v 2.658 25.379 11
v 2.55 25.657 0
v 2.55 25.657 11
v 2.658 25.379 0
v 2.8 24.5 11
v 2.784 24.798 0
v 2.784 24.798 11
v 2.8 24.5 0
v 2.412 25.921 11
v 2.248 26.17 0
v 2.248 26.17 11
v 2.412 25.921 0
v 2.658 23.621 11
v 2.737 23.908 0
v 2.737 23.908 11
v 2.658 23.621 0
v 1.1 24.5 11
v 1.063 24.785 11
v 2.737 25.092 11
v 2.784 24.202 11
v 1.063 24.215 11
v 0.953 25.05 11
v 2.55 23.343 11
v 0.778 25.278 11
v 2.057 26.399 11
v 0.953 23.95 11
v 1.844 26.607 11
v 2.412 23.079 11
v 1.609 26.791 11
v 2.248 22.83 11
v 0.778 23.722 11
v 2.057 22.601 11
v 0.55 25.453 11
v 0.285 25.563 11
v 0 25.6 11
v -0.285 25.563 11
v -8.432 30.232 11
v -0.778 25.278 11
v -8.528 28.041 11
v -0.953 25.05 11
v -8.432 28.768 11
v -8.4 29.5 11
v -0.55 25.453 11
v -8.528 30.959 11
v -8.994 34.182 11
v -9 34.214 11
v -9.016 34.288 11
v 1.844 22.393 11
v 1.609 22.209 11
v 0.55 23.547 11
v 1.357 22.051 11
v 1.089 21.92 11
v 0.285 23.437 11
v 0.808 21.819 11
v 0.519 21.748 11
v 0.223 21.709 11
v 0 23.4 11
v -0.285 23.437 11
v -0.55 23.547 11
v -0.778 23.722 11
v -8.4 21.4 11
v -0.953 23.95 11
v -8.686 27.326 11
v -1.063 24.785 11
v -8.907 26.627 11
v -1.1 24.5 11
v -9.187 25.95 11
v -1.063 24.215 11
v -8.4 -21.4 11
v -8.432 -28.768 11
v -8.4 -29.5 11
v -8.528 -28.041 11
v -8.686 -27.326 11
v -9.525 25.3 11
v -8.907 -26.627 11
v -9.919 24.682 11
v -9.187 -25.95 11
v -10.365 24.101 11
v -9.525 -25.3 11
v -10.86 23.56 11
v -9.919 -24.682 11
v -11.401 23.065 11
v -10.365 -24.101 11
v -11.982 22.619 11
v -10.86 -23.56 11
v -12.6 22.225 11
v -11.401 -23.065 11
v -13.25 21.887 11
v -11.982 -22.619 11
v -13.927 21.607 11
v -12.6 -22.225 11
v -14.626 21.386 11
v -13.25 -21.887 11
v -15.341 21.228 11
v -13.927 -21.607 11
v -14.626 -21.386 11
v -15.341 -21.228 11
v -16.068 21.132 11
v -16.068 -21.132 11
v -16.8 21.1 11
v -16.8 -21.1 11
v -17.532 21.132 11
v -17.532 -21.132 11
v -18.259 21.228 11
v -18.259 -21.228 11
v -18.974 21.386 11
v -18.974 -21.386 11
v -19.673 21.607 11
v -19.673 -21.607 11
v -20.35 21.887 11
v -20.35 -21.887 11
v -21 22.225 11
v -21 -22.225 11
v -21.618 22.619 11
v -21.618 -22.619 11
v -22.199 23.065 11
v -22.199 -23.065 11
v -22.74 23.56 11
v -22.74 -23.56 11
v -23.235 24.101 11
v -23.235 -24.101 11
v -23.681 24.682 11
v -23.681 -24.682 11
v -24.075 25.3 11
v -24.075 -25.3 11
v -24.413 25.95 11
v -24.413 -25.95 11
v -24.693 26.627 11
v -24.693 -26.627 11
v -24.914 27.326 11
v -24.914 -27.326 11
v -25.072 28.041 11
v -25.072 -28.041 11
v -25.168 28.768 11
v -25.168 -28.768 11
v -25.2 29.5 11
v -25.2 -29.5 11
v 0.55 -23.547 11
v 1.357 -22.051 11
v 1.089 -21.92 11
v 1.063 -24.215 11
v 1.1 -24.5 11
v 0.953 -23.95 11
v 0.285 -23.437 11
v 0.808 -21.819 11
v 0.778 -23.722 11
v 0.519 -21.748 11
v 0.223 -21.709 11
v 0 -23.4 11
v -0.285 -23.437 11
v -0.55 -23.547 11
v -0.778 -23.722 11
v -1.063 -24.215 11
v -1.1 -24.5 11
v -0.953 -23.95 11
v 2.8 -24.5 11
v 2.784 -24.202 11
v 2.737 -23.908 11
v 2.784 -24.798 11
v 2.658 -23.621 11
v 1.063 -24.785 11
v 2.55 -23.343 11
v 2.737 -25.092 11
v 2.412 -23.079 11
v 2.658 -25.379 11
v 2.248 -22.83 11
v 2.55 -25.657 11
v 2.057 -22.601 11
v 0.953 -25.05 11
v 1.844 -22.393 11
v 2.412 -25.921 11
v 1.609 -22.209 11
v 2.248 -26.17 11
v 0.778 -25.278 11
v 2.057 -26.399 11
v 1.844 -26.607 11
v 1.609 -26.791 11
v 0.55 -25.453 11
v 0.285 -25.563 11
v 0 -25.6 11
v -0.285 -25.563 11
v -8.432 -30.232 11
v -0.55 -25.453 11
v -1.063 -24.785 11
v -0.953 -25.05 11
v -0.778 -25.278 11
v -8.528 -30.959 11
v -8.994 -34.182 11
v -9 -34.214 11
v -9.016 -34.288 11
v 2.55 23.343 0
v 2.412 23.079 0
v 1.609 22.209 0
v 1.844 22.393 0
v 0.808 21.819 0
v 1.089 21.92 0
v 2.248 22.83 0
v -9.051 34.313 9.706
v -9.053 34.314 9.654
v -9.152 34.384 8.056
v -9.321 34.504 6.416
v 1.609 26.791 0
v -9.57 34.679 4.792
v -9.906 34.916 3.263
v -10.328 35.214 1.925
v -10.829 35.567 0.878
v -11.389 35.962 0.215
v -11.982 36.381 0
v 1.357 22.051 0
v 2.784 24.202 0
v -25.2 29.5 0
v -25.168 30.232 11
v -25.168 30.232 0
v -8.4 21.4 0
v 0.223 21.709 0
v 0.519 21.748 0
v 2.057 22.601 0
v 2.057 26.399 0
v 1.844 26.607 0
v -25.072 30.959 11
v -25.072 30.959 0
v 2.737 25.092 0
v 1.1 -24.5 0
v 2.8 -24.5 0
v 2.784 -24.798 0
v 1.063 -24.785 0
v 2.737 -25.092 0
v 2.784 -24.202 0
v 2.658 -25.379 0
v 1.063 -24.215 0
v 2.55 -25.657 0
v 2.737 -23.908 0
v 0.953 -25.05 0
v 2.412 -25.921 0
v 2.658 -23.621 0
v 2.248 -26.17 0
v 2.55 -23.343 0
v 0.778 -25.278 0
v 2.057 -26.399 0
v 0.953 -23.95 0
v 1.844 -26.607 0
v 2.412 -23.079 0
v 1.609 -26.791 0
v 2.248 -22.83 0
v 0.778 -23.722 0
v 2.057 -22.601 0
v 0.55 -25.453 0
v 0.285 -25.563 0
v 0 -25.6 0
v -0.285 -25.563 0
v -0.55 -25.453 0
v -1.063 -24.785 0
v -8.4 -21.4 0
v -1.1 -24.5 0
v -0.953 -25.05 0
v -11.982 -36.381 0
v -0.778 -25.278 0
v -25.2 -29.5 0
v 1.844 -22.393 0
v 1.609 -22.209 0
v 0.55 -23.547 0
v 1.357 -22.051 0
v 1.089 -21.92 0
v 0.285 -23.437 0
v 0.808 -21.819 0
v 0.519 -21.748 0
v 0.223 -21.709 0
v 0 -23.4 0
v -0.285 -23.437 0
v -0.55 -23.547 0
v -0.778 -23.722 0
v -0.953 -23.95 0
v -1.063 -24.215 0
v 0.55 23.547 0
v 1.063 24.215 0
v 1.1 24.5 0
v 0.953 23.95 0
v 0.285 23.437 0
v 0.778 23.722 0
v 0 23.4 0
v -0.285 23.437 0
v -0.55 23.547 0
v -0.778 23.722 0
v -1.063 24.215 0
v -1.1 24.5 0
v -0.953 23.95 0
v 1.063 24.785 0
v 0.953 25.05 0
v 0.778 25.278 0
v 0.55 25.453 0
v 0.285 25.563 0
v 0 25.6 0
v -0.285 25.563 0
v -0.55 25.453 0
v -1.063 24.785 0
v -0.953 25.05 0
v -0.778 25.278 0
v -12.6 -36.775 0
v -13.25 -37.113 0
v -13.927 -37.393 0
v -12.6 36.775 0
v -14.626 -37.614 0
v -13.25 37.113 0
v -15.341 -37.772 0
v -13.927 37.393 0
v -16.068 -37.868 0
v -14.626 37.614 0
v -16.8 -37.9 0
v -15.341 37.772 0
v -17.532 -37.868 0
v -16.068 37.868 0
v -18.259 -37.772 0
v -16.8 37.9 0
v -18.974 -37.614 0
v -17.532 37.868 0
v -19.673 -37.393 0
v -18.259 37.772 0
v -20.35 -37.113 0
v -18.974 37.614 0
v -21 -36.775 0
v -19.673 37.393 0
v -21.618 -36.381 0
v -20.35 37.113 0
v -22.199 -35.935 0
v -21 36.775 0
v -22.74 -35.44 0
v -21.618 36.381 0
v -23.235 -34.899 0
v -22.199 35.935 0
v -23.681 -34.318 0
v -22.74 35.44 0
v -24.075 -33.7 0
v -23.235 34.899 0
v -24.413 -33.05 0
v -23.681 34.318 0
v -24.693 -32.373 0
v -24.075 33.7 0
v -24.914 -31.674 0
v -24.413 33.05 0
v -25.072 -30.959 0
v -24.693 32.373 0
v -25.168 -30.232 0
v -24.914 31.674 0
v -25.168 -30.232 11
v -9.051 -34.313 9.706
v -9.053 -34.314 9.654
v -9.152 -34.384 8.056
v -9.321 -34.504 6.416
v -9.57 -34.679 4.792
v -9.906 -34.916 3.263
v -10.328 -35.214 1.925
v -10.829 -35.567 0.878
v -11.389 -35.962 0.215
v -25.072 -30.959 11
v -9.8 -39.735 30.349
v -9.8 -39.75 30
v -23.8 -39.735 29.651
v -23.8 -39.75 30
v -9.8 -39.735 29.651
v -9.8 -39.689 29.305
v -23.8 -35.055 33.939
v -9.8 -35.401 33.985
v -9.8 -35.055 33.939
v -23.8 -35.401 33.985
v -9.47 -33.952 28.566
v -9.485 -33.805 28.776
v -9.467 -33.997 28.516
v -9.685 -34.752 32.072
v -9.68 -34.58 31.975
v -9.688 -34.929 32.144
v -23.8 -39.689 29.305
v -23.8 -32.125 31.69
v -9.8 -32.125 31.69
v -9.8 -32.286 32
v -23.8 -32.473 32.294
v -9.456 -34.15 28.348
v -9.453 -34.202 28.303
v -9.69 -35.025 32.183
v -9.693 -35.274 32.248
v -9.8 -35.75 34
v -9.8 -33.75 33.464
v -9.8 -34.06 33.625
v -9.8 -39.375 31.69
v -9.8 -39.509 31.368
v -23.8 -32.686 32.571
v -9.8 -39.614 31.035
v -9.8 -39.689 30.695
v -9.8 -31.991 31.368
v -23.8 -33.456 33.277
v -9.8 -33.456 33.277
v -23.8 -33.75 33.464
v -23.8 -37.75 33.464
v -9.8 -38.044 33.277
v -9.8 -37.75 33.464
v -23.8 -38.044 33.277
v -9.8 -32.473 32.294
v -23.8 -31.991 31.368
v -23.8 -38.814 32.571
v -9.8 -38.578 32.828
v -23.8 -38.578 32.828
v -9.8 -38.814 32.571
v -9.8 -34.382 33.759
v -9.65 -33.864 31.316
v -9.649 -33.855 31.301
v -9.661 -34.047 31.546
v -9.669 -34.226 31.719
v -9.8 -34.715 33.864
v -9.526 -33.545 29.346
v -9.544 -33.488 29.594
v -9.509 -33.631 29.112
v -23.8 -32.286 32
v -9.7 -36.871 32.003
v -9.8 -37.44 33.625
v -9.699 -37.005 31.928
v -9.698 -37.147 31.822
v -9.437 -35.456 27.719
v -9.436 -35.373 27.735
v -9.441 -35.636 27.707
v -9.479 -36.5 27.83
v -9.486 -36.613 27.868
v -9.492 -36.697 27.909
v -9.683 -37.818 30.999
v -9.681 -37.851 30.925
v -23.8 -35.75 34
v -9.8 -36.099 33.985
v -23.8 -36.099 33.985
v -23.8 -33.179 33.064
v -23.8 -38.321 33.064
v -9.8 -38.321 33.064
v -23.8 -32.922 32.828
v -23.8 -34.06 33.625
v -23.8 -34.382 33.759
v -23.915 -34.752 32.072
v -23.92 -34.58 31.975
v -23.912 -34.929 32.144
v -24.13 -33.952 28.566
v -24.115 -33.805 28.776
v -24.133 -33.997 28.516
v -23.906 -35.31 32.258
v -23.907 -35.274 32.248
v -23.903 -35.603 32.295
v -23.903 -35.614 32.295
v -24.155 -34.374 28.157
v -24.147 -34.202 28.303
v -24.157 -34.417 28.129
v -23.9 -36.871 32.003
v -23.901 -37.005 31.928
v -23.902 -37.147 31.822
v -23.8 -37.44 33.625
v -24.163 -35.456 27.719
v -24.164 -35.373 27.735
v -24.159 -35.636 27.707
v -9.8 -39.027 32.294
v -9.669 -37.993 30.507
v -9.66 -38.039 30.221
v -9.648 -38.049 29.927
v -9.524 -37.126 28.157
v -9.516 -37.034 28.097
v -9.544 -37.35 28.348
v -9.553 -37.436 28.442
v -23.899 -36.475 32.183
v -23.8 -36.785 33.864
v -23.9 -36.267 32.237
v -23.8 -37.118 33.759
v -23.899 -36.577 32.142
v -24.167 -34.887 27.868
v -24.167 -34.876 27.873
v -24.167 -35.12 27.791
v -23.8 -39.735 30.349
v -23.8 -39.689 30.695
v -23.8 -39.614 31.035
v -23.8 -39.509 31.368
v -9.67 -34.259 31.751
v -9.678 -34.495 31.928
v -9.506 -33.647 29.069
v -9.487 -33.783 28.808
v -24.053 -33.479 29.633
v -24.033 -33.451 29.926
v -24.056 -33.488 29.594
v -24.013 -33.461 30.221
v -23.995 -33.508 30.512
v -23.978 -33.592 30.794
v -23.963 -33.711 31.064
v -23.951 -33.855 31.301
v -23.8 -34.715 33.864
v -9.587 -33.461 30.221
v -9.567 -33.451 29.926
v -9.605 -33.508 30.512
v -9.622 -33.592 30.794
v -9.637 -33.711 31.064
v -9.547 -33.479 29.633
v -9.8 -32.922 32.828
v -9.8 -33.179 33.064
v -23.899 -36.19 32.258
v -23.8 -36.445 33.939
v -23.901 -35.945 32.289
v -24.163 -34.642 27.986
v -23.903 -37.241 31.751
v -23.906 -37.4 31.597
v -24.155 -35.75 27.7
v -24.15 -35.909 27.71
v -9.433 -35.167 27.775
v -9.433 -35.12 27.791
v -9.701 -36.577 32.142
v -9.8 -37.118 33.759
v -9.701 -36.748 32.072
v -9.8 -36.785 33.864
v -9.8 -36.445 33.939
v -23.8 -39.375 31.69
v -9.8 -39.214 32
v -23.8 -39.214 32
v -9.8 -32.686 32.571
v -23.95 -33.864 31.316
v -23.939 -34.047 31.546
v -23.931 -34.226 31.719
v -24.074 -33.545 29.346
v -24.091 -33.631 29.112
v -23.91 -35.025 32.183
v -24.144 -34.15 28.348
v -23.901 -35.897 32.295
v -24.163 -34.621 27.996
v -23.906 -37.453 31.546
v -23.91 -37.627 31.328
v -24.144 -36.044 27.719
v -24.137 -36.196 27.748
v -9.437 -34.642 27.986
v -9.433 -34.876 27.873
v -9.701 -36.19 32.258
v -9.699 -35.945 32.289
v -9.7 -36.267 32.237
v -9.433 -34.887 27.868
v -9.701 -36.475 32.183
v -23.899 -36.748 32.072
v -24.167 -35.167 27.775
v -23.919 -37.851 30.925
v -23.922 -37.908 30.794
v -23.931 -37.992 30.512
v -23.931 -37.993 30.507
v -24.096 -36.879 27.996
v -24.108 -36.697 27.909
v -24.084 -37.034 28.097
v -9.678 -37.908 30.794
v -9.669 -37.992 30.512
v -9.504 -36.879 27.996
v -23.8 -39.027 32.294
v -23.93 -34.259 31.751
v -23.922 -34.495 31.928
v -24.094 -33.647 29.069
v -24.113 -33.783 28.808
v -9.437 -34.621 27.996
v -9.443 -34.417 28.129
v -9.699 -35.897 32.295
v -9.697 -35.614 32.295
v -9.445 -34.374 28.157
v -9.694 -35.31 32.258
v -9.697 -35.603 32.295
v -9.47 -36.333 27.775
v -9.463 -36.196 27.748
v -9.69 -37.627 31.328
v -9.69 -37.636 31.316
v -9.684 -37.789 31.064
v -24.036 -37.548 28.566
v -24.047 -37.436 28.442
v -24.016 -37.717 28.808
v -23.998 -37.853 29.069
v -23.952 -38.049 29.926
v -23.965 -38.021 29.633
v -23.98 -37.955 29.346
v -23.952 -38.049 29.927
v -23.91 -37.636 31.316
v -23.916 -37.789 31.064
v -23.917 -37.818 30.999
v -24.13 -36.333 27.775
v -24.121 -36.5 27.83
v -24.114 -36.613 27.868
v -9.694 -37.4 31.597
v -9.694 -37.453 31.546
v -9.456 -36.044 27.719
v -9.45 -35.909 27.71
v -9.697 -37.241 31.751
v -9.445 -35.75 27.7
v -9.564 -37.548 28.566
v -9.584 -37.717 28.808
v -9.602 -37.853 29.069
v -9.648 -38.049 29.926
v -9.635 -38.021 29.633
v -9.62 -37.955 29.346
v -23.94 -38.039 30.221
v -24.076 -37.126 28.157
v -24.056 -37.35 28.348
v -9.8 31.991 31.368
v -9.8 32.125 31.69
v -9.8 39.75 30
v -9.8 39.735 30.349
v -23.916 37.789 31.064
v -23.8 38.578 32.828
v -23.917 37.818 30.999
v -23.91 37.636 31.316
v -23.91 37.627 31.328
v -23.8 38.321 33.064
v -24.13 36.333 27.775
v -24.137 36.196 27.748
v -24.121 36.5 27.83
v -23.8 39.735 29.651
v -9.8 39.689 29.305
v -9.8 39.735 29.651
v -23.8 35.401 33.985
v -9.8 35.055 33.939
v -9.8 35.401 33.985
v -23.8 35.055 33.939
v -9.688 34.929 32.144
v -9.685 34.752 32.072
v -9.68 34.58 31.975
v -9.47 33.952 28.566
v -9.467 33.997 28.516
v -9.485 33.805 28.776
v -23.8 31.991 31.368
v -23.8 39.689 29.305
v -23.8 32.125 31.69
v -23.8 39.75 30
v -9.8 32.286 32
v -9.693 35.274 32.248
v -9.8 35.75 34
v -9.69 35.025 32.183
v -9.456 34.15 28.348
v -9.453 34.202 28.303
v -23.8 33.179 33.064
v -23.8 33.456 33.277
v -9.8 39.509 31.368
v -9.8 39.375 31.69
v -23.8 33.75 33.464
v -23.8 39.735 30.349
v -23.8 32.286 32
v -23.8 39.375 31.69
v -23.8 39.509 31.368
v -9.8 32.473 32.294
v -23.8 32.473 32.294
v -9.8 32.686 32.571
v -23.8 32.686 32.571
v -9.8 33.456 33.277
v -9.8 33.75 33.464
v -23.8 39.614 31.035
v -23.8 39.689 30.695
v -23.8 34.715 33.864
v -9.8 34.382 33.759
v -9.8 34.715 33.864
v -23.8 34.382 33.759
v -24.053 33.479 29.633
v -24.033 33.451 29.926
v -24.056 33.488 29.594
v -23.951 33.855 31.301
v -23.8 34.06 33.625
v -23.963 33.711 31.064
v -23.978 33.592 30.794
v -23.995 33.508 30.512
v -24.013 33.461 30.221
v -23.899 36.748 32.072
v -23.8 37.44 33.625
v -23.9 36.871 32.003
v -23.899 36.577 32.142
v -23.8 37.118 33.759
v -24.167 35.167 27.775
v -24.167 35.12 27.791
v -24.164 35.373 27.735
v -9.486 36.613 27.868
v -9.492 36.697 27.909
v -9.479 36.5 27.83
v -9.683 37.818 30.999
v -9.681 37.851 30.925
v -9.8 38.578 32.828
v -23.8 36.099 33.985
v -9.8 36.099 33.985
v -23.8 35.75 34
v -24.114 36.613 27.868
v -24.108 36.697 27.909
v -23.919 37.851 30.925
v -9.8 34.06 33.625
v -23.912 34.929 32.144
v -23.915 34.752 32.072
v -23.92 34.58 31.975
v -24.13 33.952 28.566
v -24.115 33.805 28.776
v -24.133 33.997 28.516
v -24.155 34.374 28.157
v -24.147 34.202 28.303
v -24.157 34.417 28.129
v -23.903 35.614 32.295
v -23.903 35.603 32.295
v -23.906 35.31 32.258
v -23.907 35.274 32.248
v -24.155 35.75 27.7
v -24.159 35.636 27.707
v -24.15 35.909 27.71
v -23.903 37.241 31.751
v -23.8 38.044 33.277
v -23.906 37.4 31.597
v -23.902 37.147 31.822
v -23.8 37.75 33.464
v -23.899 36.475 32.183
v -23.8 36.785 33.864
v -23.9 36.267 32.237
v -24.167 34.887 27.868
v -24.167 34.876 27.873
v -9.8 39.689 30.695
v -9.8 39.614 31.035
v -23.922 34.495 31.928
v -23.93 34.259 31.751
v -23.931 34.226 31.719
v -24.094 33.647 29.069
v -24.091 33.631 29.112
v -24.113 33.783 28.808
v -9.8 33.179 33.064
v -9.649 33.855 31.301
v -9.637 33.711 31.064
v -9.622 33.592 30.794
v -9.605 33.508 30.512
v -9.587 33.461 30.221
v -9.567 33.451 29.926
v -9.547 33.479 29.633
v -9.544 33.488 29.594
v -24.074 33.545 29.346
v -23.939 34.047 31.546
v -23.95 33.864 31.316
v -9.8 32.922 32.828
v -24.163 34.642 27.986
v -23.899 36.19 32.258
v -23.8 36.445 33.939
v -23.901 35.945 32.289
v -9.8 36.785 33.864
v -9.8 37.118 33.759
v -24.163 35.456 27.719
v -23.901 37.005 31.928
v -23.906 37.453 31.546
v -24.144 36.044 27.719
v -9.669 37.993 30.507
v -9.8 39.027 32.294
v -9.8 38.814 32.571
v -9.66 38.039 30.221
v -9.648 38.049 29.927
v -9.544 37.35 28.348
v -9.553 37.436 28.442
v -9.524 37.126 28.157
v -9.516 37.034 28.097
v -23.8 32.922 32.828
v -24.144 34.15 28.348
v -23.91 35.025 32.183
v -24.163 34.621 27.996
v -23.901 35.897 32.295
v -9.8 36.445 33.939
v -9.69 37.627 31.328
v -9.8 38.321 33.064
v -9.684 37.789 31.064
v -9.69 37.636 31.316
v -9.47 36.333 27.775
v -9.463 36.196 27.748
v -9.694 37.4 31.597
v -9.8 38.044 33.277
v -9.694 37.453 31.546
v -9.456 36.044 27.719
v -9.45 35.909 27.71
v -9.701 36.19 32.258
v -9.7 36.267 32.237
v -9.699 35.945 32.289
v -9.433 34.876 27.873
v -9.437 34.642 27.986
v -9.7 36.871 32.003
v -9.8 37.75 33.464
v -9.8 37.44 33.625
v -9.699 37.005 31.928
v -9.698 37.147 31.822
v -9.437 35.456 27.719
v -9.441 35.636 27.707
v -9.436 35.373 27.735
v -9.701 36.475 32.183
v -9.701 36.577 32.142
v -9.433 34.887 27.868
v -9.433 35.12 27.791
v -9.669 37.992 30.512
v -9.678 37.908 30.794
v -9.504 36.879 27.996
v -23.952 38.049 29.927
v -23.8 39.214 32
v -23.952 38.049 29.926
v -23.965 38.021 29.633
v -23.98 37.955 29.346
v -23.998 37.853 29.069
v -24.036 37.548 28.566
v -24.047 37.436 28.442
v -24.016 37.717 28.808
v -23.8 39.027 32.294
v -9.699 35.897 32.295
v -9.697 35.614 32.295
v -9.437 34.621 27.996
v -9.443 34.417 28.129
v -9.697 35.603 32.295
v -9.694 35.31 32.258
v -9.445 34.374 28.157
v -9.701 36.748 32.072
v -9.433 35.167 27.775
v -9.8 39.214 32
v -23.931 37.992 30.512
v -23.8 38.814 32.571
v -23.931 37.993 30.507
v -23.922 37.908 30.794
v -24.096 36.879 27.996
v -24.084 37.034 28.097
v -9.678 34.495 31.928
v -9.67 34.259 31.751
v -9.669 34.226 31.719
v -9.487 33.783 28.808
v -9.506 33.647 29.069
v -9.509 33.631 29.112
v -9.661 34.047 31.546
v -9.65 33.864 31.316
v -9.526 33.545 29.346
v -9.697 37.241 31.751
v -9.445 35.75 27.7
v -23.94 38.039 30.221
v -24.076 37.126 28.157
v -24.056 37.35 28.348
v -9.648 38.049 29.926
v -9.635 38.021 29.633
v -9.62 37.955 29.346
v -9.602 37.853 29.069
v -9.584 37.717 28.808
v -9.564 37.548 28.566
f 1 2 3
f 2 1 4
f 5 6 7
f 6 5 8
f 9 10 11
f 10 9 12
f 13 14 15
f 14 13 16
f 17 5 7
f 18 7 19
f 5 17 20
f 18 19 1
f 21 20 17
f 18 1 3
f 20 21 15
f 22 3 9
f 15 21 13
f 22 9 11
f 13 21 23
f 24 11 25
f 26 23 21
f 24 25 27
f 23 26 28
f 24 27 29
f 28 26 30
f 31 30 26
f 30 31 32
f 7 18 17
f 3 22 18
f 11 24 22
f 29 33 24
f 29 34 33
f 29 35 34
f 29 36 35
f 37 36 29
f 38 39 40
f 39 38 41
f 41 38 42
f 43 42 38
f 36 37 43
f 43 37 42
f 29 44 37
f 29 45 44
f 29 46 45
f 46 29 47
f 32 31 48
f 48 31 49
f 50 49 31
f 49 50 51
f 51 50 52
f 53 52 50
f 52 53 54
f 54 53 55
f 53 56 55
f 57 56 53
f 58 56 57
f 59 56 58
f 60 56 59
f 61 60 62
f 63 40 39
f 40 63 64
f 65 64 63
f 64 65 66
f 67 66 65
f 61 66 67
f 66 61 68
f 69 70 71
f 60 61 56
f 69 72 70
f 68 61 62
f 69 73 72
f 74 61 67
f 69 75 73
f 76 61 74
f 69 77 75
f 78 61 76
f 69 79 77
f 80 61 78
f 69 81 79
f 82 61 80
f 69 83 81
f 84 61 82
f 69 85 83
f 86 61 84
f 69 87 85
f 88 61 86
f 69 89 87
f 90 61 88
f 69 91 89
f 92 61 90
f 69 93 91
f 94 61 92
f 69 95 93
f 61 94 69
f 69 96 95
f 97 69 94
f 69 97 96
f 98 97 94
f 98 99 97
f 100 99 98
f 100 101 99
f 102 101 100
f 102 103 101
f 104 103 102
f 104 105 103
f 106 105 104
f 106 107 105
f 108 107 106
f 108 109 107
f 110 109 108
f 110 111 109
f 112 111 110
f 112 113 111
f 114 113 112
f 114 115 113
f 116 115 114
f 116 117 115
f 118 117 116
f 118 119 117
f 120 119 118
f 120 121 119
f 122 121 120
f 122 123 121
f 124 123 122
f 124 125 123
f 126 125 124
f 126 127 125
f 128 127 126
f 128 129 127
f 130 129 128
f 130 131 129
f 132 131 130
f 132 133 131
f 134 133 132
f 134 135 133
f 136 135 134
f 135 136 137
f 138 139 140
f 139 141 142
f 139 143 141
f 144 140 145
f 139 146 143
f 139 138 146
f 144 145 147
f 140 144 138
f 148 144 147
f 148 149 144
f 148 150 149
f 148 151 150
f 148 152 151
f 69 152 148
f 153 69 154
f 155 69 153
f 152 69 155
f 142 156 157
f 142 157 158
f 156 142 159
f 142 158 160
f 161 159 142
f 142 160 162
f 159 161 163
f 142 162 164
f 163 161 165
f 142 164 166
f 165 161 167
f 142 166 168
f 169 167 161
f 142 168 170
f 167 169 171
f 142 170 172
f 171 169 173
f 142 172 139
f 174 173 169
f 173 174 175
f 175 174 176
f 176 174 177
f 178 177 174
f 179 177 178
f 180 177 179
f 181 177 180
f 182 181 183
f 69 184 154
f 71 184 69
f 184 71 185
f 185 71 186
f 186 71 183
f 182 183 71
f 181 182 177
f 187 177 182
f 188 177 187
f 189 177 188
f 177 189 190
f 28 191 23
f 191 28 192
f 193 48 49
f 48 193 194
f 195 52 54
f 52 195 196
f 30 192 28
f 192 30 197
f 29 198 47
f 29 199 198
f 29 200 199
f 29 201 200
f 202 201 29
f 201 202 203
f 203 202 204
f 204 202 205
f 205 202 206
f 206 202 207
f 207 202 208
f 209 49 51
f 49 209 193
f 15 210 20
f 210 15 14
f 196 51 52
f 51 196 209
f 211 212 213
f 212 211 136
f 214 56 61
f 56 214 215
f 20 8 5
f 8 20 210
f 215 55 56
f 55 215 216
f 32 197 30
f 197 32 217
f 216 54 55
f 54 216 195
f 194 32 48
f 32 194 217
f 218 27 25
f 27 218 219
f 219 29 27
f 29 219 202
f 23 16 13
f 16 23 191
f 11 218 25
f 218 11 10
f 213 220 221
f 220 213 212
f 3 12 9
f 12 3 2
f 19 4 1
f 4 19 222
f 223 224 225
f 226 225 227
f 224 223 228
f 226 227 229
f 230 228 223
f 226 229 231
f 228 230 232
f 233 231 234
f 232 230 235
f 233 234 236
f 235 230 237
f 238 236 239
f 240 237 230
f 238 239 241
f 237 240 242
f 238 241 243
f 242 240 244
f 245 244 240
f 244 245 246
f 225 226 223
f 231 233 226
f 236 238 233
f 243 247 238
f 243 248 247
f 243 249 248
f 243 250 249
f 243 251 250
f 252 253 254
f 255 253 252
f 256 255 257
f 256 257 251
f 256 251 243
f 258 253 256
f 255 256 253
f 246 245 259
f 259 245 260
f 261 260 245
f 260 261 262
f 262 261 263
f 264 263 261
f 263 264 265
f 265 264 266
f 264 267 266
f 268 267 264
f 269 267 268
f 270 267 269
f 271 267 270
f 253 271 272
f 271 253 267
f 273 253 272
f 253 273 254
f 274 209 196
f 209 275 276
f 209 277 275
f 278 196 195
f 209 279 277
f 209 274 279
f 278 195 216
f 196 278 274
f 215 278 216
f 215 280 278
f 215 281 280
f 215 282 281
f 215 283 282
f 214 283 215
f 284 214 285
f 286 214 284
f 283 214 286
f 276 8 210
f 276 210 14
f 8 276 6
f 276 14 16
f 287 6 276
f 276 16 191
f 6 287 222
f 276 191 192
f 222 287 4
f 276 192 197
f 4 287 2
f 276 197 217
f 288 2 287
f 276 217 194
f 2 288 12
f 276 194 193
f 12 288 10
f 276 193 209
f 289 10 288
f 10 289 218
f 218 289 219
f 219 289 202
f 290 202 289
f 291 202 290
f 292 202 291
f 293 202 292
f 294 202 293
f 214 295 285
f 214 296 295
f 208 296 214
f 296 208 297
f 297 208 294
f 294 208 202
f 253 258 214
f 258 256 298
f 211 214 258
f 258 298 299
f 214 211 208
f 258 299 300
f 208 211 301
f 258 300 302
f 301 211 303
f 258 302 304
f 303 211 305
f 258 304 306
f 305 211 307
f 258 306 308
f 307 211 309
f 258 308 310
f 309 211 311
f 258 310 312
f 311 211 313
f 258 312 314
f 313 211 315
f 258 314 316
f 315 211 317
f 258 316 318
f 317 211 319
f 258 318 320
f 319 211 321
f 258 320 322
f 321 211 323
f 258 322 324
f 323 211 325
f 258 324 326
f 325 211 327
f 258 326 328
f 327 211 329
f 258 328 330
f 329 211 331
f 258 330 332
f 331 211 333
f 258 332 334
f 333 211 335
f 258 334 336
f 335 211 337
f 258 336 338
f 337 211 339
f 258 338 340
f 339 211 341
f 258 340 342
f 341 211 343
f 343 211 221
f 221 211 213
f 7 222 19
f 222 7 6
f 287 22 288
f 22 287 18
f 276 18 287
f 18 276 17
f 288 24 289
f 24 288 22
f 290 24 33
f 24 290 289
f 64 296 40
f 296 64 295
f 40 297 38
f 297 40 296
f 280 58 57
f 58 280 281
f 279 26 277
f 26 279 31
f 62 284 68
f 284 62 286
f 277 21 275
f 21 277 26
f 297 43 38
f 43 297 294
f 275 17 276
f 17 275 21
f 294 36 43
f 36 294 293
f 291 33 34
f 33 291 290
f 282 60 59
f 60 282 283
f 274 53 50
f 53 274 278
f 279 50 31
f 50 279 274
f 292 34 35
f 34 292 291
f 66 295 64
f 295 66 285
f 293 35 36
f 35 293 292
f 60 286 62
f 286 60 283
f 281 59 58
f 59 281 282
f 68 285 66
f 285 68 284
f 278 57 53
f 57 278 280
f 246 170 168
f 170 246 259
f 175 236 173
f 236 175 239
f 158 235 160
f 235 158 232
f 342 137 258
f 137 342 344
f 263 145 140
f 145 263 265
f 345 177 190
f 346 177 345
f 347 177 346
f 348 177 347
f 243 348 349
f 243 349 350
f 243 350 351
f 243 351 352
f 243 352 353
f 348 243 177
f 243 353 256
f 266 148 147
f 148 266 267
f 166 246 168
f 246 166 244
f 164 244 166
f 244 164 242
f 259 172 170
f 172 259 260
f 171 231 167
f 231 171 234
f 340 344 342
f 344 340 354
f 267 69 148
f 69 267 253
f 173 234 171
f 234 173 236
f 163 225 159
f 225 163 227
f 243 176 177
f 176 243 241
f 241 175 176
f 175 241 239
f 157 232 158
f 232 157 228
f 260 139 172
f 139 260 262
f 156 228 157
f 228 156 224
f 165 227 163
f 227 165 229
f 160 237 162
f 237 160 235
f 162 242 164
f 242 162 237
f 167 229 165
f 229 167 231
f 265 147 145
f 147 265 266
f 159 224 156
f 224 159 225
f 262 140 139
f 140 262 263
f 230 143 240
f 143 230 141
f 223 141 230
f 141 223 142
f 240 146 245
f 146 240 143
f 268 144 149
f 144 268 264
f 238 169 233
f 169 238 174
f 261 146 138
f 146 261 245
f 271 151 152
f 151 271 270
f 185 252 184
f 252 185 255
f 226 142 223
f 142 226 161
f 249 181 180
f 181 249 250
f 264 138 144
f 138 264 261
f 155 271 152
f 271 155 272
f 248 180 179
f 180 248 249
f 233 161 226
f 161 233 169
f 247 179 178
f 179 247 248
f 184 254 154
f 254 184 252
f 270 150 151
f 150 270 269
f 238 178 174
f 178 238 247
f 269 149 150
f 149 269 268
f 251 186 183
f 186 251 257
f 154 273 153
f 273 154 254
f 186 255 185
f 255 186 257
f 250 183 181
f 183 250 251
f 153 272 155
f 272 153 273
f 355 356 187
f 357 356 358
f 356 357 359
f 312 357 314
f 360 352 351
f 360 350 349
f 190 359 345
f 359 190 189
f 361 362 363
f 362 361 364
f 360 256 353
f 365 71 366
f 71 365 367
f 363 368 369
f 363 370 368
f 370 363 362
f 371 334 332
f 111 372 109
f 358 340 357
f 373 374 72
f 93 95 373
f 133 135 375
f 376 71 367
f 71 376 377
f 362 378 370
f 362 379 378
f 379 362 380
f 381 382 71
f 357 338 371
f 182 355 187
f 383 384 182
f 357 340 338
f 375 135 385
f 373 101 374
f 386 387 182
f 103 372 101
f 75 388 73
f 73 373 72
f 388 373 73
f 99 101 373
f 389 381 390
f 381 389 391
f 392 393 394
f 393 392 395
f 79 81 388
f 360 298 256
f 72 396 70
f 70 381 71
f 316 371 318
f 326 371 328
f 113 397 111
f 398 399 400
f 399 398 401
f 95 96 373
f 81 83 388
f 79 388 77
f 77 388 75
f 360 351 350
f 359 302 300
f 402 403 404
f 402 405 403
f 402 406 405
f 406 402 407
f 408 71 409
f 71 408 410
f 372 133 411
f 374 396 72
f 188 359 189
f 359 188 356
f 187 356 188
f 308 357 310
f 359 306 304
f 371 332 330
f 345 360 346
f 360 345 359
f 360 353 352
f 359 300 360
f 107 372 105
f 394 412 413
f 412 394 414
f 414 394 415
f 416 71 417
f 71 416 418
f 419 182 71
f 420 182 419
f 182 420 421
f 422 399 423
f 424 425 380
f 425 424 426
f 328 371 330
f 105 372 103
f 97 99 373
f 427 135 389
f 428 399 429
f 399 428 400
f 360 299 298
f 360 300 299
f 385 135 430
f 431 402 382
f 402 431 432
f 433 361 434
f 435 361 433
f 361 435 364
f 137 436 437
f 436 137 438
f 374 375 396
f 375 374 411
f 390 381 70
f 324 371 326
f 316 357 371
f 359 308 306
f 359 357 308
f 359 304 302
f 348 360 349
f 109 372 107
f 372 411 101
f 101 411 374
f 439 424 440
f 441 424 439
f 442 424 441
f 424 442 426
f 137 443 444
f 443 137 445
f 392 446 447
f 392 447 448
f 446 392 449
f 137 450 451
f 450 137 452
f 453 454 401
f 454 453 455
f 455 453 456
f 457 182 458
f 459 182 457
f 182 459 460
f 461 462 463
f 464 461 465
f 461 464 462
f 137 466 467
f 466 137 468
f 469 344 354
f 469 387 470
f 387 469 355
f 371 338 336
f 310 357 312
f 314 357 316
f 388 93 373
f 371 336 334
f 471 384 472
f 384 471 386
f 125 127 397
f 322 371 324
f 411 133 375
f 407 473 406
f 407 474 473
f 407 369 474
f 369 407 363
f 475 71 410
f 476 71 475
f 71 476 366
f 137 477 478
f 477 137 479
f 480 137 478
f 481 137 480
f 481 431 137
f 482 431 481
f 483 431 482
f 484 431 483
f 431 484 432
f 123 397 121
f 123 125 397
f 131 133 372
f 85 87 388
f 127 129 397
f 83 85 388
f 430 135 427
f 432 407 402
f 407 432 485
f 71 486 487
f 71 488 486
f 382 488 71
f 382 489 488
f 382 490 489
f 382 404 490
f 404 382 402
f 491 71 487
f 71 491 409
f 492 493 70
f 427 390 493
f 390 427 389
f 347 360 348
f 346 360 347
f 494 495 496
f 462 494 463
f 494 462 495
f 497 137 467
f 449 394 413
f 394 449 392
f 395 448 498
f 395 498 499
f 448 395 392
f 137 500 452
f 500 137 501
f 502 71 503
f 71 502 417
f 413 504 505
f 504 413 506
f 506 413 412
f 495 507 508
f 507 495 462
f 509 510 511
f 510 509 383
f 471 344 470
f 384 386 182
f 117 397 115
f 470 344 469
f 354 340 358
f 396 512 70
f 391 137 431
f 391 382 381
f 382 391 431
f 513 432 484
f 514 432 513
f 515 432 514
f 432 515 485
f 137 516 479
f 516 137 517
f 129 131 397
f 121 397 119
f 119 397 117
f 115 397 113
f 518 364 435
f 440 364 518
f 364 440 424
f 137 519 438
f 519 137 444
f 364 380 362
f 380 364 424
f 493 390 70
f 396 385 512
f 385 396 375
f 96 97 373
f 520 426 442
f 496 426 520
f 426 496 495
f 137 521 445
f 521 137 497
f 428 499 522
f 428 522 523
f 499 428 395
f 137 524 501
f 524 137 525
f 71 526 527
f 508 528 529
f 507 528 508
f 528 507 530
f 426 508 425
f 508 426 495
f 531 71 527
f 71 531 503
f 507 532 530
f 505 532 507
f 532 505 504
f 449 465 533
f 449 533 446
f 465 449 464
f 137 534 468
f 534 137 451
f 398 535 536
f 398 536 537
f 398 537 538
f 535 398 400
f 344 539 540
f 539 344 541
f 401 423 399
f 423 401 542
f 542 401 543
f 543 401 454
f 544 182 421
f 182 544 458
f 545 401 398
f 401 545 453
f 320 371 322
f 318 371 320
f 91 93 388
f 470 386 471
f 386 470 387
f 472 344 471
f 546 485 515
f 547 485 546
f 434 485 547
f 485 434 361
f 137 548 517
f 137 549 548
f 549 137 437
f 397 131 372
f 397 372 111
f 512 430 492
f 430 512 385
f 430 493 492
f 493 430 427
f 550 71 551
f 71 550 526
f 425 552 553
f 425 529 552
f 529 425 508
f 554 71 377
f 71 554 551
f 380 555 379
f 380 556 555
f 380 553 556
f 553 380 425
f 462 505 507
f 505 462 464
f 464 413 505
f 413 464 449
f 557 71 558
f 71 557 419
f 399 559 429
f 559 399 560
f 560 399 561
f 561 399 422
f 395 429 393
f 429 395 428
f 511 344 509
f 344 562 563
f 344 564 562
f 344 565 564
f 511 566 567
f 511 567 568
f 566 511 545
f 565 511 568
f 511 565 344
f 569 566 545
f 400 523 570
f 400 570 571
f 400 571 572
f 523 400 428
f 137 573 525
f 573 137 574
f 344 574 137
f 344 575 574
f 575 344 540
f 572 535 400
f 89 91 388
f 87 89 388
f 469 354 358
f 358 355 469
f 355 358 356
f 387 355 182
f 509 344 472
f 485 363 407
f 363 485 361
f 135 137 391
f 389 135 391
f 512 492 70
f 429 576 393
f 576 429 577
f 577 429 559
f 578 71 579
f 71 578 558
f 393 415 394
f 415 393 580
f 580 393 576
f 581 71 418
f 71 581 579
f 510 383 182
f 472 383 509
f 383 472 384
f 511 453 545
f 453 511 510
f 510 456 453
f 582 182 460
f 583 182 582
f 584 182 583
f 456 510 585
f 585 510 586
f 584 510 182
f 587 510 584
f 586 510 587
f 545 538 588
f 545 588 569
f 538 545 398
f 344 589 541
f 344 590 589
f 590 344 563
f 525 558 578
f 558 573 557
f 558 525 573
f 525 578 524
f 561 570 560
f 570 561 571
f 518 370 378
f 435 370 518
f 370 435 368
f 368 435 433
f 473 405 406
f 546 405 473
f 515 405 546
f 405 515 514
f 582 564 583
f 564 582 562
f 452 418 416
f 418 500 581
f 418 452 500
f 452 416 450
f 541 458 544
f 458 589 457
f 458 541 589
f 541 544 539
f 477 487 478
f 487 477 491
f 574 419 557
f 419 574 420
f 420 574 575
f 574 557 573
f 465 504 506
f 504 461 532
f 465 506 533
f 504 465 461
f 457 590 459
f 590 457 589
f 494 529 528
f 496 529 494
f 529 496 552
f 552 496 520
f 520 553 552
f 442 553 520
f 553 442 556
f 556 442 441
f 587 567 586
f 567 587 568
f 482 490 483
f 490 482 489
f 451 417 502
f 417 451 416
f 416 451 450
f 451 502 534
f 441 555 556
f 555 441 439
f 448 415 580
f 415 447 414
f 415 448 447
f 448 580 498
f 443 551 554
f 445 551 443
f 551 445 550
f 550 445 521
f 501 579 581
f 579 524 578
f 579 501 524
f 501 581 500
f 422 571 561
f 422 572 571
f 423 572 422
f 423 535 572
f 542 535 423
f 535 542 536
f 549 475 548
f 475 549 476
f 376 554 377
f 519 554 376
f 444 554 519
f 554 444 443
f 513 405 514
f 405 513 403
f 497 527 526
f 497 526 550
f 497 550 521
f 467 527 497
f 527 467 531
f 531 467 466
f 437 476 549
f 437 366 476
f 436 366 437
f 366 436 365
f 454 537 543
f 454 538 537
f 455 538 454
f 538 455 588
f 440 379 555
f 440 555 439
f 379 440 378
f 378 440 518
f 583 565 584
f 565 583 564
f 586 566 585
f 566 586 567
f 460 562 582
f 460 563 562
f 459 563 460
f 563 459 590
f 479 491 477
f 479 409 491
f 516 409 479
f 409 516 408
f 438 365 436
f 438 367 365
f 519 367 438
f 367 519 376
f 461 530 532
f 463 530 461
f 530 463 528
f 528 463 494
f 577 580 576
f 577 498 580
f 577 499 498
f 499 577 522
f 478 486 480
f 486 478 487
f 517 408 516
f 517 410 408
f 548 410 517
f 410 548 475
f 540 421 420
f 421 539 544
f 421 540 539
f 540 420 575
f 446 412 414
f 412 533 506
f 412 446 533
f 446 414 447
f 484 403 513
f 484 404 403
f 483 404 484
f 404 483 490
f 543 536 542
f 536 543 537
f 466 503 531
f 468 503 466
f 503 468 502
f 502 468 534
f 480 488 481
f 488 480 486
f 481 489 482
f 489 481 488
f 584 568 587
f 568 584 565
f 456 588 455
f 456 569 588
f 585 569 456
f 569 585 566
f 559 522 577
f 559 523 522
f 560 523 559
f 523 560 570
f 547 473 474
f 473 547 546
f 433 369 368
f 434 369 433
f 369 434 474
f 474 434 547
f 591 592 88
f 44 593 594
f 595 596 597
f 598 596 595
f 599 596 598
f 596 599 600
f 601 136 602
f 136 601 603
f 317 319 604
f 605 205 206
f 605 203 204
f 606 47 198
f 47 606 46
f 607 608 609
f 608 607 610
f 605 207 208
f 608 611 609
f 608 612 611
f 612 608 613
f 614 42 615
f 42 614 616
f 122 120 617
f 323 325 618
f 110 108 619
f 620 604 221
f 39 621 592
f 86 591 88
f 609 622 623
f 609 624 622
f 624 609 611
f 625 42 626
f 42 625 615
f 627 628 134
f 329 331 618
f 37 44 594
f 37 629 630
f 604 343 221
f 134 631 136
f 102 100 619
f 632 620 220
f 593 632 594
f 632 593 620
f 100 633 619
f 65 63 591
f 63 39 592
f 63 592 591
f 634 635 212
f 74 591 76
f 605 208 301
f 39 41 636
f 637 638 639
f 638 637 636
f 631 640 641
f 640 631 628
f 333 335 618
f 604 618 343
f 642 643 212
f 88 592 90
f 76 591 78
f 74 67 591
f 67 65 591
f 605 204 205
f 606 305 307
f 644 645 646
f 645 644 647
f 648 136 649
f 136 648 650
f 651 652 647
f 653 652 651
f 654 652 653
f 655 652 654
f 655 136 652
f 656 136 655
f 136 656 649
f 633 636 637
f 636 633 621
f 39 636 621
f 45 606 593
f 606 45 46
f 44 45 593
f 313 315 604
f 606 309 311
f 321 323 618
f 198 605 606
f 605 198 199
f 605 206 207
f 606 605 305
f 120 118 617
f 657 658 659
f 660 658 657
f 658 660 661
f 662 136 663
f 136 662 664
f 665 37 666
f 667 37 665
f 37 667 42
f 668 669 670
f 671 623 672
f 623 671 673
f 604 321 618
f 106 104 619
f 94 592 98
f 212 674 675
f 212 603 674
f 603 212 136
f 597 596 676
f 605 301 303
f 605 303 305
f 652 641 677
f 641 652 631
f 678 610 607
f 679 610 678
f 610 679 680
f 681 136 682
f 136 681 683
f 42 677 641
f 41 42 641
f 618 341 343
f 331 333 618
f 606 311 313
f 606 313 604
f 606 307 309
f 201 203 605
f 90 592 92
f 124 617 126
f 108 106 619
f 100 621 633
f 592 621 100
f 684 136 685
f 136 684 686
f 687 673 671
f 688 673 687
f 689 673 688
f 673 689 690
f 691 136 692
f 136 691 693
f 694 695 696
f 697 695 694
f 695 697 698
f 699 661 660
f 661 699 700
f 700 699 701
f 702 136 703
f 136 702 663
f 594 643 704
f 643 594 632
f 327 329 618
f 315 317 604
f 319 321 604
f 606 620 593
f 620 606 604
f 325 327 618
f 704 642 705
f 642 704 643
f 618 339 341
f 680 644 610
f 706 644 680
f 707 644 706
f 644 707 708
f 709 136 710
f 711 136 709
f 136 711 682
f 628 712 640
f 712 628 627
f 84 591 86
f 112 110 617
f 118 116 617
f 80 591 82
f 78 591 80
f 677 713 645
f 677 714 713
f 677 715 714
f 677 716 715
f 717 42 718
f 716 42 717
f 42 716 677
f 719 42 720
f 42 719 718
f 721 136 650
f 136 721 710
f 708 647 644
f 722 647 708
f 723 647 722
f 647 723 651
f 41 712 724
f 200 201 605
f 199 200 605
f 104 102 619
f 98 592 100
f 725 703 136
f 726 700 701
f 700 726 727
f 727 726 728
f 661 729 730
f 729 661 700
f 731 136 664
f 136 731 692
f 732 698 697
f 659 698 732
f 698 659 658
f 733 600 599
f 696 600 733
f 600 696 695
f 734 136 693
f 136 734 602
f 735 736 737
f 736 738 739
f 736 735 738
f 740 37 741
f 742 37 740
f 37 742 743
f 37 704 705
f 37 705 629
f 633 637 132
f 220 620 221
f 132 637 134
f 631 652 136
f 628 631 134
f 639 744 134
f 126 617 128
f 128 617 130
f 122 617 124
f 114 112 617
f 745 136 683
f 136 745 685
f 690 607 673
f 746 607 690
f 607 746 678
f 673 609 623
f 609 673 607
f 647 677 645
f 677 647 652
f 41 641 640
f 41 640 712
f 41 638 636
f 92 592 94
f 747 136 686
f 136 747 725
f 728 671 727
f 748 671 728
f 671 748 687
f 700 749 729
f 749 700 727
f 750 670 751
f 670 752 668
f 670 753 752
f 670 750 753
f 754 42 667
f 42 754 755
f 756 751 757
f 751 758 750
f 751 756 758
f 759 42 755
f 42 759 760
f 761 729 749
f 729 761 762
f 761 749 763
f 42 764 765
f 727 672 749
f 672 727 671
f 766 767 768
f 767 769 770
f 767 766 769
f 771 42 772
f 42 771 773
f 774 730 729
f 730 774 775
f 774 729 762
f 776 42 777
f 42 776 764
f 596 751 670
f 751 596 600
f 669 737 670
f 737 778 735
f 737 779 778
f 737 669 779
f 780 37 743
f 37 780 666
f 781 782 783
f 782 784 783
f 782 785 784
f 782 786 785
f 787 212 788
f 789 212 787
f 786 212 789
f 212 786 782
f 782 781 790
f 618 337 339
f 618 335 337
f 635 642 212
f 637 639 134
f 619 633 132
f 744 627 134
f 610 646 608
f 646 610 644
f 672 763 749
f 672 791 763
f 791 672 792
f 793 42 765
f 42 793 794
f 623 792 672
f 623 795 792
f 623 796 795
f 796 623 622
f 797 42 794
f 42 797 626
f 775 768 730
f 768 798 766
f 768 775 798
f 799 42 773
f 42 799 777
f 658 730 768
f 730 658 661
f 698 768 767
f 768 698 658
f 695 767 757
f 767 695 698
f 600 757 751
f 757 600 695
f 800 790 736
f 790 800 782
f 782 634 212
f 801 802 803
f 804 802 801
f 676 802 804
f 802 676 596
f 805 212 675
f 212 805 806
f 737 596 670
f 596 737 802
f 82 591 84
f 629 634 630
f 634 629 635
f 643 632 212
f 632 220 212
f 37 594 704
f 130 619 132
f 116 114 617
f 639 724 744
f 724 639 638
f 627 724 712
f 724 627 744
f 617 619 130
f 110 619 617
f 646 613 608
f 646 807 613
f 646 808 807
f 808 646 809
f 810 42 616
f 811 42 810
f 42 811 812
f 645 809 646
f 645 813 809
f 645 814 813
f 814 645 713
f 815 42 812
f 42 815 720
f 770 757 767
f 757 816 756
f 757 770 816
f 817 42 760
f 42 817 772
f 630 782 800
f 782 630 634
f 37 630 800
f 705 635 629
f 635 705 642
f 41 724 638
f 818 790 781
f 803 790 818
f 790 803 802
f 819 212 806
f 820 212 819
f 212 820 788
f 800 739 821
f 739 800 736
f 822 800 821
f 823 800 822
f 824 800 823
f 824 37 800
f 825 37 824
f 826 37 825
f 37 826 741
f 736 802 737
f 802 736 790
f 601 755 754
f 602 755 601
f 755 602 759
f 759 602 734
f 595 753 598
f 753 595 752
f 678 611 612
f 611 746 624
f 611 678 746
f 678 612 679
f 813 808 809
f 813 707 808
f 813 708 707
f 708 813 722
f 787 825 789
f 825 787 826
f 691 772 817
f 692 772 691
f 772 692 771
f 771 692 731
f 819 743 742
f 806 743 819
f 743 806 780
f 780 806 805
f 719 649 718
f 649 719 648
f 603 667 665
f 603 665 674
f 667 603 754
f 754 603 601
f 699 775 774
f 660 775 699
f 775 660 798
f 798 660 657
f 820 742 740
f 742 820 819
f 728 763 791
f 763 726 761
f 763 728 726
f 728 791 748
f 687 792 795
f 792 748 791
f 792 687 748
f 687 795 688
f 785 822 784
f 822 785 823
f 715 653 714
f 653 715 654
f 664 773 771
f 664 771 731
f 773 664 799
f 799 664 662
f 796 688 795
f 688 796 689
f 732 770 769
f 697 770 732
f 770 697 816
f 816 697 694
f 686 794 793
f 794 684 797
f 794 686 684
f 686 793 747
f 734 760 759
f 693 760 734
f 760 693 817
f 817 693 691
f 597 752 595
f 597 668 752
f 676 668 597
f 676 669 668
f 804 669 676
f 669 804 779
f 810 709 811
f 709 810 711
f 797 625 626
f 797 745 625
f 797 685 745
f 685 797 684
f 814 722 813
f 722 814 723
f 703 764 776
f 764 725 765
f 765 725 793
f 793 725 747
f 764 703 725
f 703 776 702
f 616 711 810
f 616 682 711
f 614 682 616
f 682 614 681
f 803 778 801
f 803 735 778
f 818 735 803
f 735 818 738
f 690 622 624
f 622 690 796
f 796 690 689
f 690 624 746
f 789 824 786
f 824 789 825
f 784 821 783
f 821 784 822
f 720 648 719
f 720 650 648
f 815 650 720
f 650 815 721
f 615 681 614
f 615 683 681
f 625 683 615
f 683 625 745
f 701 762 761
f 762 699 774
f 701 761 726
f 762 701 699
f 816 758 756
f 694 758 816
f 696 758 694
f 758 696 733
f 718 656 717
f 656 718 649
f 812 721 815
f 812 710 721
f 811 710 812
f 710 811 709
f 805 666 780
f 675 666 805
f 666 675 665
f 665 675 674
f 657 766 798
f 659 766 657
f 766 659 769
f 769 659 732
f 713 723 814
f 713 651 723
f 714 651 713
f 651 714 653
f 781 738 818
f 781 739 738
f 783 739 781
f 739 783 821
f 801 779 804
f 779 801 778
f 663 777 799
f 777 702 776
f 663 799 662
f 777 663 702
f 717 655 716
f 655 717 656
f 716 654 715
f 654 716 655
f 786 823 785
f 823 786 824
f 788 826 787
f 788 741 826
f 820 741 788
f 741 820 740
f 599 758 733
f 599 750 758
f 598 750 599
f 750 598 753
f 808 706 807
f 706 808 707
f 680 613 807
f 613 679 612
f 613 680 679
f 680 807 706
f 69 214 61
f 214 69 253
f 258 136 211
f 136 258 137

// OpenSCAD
$fa = 5;
$fs = 0.3;

pi_hole_d = 2.2;
pi_d = 5.6;
pi_h = 11;
pi_hold_gap = 49;

fan_height = 30;
fan_hole_d = 4.6;
fan_d = 8;
fan_h = 14;
fan_hold_gap = 71.5;

difference() {
    hull() {
        translate([0, pi_hold_gap/2, 0])
        cylinder(d = pi_d, h = pi_h);

        translate([-pi_d*3, pi_hold_gap/2+5, 0])
        cylinder(d = pi_d*3, h = pi_h);
    }
    translate([0, pi_hold_gap/2, 0])
    translate([0, 0, -1])
    cylinder(d = pi_hole_d, h = pi_h+2);

}

difference() {
    hull() {
        translate([0, -pi_hold_gap/2, 0])
        cylinder(d = pi_d, h = pi_h);

        translate([-pi_d*3, -pi_hold_gap/2-5, 0])
        cylinder(d = pi_d*3, h = pi_h);
    }
    translate([0, -pi_hold_gap/2, 0])
    translate([0, 0, -1])
    cylinder(d = pi_hole_d, h = pi_h+2);

}

hull() {
    translate([-pi_d*3, pi_hold_gap/2+5, 0])
    cylinder(d = pi_d*3, h = pi_h);
    translate([-pi_d*3, -pi_hold_gap/2-5, 0])
    cylinder(d = pi_d*3, h = pi_h); 
}

difference() {
    hull() {
        
        translate([-pi_d*3, -fan_hold_gap/2, fan_height])
        rotate([0, 90, 0])
        cylinder(d = fan_d, h = fan_h, center=true);

        translate([-pi_d*3, -pi_hold_gap/2-5, 0])
        cylinder(d = pi_d*3, h = pi_h);
    }
    translate([-pi_d*3, -fan_hold_gap/2, fan_height])
    rotate([0, 90, 0])
    cylinder(d = fan_hole_d, h = fan_h+2, center=true);

}

mirror([0, 1, 0])
difference() {
    hull() {
        
        translate([-pi_d*3, -fan_hold_gap/2, fan_height])
        rotate([0, 90, 0])
        cylinder(d = fan_d, h = fan_h, center=true);

        translate([-pi_d*3, -pi_hold_gap/2-5, 0])
        cylinder(d = pi_d*3, h = pi_h);
    }
    translate([-pi_d*3, -fan_hold_gap/2, fan_height])
    rotate([0, 90, 0])
    cylinder(d = fan_hole_d, h = fan_h+2, center=true);

}
